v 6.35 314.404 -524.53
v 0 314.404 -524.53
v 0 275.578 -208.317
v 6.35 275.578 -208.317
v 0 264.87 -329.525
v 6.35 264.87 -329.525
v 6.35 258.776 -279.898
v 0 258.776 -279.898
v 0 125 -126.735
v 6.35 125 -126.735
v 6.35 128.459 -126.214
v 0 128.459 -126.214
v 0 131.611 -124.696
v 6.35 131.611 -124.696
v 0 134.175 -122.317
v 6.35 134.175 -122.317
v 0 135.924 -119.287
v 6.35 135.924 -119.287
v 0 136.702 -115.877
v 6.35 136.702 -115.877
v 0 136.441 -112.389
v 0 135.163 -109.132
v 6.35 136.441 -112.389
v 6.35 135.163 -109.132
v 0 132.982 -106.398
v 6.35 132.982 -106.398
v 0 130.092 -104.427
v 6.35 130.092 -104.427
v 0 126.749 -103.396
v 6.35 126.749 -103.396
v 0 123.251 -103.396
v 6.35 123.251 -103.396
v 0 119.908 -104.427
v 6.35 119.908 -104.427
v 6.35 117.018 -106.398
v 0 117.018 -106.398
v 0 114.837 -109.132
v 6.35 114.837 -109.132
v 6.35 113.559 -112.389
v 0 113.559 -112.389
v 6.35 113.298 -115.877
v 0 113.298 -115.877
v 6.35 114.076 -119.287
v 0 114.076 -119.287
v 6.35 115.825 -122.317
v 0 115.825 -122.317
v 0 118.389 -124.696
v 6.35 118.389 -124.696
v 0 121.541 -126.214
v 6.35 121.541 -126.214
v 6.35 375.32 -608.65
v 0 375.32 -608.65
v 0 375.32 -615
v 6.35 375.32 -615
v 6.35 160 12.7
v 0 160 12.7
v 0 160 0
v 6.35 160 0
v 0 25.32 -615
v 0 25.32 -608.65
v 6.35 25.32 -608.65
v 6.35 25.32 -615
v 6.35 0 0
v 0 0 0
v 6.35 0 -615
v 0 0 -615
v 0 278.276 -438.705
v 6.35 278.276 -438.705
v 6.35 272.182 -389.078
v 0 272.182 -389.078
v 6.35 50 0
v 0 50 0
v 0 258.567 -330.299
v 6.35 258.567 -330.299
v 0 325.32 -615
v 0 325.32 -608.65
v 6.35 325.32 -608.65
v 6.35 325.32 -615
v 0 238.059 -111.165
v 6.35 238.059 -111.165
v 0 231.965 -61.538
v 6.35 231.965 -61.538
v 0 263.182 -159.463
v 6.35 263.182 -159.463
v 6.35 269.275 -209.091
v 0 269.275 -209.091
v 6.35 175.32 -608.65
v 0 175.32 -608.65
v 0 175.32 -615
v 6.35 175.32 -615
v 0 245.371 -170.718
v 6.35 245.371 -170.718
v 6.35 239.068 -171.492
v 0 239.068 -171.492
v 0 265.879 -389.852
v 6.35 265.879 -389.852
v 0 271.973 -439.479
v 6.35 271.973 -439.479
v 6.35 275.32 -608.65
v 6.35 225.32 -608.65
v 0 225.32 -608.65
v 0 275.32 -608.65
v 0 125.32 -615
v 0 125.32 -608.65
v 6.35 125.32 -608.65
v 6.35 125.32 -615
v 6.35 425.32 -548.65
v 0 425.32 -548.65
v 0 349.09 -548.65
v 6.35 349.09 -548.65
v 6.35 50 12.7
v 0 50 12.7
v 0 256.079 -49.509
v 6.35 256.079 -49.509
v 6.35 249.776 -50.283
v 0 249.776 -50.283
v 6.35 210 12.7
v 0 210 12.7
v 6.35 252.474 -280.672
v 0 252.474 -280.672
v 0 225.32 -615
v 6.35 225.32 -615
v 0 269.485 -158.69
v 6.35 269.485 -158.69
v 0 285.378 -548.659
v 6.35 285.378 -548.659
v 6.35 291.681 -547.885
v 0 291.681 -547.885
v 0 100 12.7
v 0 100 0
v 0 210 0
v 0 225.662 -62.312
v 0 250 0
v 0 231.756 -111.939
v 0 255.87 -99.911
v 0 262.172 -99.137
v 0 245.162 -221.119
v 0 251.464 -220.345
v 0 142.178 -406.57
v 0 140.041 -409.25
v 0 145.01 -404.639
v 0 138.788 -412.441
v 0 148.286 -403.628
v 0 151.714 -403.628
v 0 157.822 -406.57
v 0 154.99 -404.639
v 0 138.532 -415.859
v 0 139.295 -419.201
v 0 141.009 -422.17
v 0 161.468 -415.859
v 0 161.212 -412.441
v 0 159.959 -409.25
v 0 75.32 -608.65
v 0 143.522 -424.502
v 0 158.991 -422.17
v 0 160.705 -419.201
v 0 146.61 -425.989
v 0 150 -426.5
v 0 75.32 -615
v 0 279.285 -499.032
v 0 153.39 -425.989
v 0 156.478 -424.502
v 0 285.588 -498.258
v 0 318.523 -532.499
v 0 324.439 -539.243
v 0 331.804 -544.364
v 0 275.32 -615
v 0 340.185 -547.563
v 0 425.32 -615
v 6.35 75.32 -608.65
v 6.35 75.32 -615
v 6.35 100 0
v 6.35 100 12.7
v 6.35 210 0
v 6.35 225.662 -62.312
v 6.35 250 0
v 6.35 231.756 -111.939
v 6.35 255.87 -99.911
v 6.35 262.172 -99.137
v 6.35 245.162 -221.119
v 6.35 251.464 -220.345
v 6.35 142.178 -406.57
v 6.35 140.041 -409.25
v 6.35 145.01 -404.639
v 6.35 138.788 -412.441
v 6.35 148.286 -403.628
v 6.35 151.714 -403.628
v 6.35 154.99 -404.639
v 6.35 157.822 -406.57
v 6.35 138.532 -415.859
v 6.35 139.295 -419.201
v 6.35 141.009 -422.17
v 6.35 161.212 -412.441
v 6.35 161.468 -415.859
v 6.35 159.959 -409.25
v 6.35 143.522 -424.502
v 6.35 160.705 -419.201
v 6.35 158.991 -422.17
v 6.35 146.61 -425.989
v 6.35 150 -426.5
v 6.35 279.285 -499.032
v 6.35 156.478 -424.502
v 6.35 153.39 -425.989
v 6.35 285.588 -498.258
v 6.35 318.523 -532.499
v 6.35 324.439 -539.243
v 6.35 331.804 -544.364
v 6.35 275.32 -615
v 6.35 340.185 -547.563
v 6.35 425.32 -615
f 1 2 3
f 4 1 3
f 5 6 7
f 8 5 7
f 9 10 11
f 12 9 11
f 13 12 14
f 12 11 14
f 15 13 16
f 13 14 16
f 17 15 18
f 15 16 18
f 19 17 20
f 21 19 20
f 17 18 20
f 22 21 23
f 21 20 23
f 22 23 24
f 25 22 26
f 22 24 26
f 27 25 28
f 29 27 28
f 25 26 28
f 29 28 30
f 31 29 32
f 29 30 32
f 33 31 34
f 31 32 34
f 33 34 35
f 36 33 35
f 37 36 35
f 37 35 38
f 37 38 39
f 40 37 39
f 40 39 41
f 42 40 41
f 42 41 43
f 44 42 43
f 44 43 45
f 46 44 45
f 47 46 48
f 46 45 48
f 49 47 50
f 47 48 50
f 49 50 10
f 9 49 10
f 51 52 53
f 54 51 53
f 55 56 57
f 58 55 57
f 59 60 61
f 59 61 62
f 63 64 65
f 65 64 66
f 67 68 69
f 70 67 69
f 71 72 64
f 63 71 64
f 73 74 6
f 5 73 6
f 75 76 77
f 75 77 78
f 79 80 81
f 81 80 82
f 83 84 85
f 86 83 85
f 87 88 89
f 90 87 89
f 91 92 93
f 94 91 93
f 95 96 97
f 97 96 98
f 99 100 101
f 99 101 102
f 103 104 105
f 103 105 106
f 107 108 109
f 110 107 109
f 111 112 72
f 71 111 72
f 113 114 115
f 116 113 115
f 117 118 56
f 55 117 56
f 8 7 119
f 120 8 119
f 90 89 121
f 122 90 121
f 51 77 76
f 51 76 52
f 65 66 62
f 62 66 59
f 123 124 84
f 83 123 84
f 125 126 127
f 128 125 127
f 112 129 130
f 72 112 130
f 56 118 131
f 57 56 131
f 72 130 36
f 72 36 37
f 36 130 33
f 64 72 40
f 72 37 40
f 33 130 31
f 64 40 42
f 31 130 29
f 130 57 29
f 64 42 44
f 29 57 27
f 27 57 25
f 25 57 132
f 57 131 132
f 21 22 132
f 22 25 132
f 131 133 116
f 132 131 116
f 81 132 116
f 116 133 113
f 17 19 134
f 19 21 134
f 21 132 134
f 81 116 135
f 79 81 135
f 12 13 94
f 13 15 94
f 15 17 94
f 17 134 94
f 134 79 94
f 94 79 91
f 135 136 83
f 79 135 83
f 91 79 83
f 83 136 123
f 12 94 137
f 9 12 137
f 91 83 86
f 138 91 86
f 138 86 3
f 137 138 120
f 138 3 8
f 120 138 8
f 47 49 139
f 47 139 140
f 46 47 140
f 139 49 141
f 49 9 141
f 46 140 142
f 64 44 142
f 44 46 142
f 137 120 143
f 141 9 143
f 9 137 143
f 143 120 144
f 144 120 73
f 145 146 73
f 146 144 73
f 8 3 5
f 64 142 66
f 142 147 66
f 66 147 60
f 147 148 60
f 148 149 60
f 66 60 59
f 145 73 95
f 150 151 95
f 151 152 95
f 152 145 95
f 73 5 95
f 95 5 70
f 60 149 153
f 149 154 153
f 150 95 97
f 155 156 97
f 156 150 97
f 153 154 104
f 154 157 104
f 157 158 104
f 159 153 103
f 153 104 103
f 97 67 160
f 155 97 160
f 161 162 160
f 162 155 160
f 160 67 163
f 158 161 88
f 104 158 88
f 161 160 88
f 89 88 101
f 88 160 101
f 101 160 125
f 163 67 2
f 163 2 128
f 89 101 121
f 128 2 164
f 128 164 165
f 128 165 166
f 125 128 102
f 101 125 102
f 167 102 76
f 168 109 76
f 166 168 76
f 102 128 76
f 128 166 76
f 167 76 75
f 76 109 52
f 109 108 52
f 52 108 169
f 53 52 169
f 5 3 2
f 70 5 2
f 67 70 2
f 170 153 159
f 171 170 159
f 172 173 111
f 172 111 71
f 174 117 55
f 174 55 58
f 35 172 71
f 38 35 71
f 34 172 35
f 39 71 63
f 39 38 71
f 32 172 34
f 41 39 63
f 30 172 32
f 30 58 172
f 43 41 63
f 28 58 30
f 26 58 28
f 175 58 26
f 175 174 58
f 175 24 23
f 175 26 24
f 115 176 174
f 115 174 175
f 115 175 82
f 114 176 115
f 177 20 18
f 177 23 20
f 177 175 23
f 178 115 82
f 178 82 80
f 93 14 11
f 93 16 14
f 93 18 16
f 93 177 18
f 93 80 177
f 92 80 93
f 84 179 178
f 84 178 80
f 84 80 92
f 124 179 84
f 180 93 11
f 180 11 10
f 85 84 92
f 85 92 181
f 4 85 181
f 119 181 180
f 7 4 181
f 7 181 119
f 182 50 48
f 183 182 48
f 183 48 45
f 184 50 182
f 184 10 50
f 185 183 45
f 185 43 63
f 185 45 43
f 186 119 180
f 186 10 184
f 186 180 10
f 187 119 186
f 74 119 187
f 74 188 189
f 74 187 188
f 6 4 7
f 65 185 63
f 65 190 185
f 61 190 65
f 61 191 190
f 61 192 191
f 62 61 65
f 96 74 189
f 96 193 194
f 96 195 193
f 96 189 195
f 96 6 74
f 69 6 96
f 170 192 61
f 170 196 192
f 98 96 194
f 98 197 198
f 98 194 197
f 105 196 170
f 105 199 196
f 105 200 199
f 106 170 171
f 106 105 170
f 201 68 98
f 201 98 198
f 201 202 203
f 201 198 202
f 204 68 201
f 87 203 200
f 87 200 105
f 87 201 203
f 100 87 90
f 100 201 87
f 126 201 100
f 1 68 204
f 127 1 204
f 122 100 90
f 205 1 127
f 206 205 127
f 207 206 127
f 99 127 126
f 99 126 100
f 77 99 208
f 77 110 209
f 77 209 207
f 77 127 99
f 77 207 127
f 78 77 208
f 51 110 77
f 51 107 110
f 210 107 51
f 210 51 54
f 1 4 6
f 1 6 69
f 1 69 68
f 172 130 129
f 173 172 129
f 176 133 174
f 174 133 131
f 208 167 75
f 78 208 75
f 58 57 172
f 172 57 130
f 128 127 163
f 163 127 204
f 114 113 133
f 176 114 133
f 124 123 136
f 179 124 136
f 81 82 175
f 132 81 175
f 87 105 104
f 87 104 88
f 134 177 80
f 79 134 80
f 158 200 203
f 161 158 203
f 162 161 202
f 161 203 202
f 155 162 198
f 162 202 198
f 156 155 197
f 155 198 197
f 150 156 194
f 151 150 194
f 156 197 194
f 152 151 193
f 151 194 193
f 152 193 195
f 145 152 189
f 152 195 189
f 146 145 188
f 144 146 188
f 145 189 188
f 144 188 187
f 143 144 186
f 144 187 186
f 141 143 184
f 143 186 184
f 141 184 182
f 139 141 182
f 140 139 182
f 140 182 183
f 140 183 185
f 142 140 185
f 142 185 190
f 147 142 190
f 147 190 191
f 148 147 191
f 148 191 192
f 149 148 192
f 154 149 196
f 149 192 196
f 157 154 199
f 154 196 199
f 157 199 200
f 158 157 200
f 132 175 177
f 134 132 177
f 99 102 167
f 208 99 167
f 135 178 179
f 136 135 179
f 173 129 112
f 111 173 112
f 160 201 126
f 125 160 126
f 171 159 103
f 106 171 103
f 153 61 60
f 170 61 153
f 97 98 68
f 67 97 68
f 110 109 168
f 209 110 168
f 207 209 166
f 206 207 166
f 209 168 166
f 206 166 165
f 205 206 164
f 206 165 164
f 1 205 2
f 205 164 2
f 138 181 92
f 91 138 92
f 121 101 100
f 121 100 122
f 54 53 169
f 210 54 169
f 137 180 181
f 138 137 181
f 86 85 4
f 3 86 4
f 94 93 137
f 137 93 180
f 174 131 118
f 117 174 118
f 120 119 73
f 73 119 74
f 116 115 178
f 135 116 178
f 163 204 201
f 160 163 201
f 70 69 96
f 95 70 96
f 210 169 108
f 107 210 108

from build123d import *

# Parameters (mm, degrees)
BOSS_EXTRUDE1_DEPTH = 6.35
SKETCH2_R           = 11.5
SKETCH2_R_2         = 11.735
SKETCH2_W           = 6.35
SKETCH2_H           = 50
CUT_EXTRUDE1_DEPTH  = 6.35


with BuildPart() as part:
    # Sketch1 → Boss-Extrude1 (new body)
    with BuildSketch(Plane(origin=(0, 0, 0), x_dir=(0, 0, -1), z_dir=(1, 0, 0))):
        with BuildLine():
            Line((0, 0), (615, 0))
            Line((615, 0), (615, 425.32))
            Line((615, 425.32), (548.65, 425.32))
            Line((548.65, 425.32), (548.65, 349.09))
            ThreePointArc((548.65, 349.09), (542.027292182, 327.966077076), (524.529993531, 314.404184936))
            Line((524.529993531, 314.404184936), (0, 250))
            Line((0, 250), (0, 210))
            Line((0, 210), (-12.7, 210))
            Line((-12.7, 210), (-12.7, 160))
            Line((-12.7, 160), (0, 160))
            Line((0, 160), (0, 100))
            Line((0, 100), (-12.7, 100))
            Line((-12.7, 100), (-12.7, 50))
            Line((-12.7, 50), (0, 50))
            Line((0, 50), (0, 0))
        make_face()
    extrude(amount=BOSS_EXTRUDE1_DEPTH)

    # Sketch2 → Cut-Extrude1 (cut)
    with BuildSketch(Plane(origin=(6.35, 0, 0), x_dir=(0, 0, -1), z_dir=(1, 0, 0))):
        with Locations((415, 150)):
            Circle(SKETCH2_R)
        with Locations((115, 125)):
            Circle(SKETCH2_R_2)
        Polygon((208.316848977, 275.57809283), (158.689541395, 269.48462566), (159.463411726, 263.181957597), (209.090719308, 269.275424767), align=None)
        Polygon((61.537861402, 231.965149724), (62.311731732, 225.662481662), (111.939039314, 231.755948832), (111.165168984, 238.058616895), align=None)
        Polygon((220.345245664, 251.464244669), (170.717938082, 245.370777499), (171.491808413, 239.068109436), (221.119115995, 245.161576606), align=None)
        Polygon((329.525322345, 264.869872444), (279.898014763, 258.776405274), (280.671885093, 252.473737211), (330.299192675, 258.567204381), align=None)
        Polygon((438.705399025, 278.275500218), (389.078091443, 272.182033048), (389.851961774, 265.879364985), (439.479269356, 271.972832155), align=None)
        Polygon((547.885475706, 291.681127993), (498.258168124, 285.587660823), (499.032038454, 279.28499276), (548.659346036, 285.37845993), align=None)
        Polygon((49.509464714, 256.078997886), (50.283335045, 249.776329823), (99.910642627, 255.869796993), (99.136772297, 262.172465056), align=None)
        with Locations((611.825, 350.32)):
            Rectangle(SKETCH2_W, SKETCH2_H)
        with Locations((611.825, 250.32)):
            Rectangle(SKETCH2_W, SKETCH2_H)
        with Locations((611.825, 150.32)):
            Rectangle(SKETCH2_W, SKETCH2_H)
        with Locations((611.825, 50.32)):
            Rectangle(SKETCH2_W, SKETCH2_H)
    extrude(amount=-CUT_EXTRUDE1_DEPTH, mode=Mode.SUBTRACT)


solid = part.part
